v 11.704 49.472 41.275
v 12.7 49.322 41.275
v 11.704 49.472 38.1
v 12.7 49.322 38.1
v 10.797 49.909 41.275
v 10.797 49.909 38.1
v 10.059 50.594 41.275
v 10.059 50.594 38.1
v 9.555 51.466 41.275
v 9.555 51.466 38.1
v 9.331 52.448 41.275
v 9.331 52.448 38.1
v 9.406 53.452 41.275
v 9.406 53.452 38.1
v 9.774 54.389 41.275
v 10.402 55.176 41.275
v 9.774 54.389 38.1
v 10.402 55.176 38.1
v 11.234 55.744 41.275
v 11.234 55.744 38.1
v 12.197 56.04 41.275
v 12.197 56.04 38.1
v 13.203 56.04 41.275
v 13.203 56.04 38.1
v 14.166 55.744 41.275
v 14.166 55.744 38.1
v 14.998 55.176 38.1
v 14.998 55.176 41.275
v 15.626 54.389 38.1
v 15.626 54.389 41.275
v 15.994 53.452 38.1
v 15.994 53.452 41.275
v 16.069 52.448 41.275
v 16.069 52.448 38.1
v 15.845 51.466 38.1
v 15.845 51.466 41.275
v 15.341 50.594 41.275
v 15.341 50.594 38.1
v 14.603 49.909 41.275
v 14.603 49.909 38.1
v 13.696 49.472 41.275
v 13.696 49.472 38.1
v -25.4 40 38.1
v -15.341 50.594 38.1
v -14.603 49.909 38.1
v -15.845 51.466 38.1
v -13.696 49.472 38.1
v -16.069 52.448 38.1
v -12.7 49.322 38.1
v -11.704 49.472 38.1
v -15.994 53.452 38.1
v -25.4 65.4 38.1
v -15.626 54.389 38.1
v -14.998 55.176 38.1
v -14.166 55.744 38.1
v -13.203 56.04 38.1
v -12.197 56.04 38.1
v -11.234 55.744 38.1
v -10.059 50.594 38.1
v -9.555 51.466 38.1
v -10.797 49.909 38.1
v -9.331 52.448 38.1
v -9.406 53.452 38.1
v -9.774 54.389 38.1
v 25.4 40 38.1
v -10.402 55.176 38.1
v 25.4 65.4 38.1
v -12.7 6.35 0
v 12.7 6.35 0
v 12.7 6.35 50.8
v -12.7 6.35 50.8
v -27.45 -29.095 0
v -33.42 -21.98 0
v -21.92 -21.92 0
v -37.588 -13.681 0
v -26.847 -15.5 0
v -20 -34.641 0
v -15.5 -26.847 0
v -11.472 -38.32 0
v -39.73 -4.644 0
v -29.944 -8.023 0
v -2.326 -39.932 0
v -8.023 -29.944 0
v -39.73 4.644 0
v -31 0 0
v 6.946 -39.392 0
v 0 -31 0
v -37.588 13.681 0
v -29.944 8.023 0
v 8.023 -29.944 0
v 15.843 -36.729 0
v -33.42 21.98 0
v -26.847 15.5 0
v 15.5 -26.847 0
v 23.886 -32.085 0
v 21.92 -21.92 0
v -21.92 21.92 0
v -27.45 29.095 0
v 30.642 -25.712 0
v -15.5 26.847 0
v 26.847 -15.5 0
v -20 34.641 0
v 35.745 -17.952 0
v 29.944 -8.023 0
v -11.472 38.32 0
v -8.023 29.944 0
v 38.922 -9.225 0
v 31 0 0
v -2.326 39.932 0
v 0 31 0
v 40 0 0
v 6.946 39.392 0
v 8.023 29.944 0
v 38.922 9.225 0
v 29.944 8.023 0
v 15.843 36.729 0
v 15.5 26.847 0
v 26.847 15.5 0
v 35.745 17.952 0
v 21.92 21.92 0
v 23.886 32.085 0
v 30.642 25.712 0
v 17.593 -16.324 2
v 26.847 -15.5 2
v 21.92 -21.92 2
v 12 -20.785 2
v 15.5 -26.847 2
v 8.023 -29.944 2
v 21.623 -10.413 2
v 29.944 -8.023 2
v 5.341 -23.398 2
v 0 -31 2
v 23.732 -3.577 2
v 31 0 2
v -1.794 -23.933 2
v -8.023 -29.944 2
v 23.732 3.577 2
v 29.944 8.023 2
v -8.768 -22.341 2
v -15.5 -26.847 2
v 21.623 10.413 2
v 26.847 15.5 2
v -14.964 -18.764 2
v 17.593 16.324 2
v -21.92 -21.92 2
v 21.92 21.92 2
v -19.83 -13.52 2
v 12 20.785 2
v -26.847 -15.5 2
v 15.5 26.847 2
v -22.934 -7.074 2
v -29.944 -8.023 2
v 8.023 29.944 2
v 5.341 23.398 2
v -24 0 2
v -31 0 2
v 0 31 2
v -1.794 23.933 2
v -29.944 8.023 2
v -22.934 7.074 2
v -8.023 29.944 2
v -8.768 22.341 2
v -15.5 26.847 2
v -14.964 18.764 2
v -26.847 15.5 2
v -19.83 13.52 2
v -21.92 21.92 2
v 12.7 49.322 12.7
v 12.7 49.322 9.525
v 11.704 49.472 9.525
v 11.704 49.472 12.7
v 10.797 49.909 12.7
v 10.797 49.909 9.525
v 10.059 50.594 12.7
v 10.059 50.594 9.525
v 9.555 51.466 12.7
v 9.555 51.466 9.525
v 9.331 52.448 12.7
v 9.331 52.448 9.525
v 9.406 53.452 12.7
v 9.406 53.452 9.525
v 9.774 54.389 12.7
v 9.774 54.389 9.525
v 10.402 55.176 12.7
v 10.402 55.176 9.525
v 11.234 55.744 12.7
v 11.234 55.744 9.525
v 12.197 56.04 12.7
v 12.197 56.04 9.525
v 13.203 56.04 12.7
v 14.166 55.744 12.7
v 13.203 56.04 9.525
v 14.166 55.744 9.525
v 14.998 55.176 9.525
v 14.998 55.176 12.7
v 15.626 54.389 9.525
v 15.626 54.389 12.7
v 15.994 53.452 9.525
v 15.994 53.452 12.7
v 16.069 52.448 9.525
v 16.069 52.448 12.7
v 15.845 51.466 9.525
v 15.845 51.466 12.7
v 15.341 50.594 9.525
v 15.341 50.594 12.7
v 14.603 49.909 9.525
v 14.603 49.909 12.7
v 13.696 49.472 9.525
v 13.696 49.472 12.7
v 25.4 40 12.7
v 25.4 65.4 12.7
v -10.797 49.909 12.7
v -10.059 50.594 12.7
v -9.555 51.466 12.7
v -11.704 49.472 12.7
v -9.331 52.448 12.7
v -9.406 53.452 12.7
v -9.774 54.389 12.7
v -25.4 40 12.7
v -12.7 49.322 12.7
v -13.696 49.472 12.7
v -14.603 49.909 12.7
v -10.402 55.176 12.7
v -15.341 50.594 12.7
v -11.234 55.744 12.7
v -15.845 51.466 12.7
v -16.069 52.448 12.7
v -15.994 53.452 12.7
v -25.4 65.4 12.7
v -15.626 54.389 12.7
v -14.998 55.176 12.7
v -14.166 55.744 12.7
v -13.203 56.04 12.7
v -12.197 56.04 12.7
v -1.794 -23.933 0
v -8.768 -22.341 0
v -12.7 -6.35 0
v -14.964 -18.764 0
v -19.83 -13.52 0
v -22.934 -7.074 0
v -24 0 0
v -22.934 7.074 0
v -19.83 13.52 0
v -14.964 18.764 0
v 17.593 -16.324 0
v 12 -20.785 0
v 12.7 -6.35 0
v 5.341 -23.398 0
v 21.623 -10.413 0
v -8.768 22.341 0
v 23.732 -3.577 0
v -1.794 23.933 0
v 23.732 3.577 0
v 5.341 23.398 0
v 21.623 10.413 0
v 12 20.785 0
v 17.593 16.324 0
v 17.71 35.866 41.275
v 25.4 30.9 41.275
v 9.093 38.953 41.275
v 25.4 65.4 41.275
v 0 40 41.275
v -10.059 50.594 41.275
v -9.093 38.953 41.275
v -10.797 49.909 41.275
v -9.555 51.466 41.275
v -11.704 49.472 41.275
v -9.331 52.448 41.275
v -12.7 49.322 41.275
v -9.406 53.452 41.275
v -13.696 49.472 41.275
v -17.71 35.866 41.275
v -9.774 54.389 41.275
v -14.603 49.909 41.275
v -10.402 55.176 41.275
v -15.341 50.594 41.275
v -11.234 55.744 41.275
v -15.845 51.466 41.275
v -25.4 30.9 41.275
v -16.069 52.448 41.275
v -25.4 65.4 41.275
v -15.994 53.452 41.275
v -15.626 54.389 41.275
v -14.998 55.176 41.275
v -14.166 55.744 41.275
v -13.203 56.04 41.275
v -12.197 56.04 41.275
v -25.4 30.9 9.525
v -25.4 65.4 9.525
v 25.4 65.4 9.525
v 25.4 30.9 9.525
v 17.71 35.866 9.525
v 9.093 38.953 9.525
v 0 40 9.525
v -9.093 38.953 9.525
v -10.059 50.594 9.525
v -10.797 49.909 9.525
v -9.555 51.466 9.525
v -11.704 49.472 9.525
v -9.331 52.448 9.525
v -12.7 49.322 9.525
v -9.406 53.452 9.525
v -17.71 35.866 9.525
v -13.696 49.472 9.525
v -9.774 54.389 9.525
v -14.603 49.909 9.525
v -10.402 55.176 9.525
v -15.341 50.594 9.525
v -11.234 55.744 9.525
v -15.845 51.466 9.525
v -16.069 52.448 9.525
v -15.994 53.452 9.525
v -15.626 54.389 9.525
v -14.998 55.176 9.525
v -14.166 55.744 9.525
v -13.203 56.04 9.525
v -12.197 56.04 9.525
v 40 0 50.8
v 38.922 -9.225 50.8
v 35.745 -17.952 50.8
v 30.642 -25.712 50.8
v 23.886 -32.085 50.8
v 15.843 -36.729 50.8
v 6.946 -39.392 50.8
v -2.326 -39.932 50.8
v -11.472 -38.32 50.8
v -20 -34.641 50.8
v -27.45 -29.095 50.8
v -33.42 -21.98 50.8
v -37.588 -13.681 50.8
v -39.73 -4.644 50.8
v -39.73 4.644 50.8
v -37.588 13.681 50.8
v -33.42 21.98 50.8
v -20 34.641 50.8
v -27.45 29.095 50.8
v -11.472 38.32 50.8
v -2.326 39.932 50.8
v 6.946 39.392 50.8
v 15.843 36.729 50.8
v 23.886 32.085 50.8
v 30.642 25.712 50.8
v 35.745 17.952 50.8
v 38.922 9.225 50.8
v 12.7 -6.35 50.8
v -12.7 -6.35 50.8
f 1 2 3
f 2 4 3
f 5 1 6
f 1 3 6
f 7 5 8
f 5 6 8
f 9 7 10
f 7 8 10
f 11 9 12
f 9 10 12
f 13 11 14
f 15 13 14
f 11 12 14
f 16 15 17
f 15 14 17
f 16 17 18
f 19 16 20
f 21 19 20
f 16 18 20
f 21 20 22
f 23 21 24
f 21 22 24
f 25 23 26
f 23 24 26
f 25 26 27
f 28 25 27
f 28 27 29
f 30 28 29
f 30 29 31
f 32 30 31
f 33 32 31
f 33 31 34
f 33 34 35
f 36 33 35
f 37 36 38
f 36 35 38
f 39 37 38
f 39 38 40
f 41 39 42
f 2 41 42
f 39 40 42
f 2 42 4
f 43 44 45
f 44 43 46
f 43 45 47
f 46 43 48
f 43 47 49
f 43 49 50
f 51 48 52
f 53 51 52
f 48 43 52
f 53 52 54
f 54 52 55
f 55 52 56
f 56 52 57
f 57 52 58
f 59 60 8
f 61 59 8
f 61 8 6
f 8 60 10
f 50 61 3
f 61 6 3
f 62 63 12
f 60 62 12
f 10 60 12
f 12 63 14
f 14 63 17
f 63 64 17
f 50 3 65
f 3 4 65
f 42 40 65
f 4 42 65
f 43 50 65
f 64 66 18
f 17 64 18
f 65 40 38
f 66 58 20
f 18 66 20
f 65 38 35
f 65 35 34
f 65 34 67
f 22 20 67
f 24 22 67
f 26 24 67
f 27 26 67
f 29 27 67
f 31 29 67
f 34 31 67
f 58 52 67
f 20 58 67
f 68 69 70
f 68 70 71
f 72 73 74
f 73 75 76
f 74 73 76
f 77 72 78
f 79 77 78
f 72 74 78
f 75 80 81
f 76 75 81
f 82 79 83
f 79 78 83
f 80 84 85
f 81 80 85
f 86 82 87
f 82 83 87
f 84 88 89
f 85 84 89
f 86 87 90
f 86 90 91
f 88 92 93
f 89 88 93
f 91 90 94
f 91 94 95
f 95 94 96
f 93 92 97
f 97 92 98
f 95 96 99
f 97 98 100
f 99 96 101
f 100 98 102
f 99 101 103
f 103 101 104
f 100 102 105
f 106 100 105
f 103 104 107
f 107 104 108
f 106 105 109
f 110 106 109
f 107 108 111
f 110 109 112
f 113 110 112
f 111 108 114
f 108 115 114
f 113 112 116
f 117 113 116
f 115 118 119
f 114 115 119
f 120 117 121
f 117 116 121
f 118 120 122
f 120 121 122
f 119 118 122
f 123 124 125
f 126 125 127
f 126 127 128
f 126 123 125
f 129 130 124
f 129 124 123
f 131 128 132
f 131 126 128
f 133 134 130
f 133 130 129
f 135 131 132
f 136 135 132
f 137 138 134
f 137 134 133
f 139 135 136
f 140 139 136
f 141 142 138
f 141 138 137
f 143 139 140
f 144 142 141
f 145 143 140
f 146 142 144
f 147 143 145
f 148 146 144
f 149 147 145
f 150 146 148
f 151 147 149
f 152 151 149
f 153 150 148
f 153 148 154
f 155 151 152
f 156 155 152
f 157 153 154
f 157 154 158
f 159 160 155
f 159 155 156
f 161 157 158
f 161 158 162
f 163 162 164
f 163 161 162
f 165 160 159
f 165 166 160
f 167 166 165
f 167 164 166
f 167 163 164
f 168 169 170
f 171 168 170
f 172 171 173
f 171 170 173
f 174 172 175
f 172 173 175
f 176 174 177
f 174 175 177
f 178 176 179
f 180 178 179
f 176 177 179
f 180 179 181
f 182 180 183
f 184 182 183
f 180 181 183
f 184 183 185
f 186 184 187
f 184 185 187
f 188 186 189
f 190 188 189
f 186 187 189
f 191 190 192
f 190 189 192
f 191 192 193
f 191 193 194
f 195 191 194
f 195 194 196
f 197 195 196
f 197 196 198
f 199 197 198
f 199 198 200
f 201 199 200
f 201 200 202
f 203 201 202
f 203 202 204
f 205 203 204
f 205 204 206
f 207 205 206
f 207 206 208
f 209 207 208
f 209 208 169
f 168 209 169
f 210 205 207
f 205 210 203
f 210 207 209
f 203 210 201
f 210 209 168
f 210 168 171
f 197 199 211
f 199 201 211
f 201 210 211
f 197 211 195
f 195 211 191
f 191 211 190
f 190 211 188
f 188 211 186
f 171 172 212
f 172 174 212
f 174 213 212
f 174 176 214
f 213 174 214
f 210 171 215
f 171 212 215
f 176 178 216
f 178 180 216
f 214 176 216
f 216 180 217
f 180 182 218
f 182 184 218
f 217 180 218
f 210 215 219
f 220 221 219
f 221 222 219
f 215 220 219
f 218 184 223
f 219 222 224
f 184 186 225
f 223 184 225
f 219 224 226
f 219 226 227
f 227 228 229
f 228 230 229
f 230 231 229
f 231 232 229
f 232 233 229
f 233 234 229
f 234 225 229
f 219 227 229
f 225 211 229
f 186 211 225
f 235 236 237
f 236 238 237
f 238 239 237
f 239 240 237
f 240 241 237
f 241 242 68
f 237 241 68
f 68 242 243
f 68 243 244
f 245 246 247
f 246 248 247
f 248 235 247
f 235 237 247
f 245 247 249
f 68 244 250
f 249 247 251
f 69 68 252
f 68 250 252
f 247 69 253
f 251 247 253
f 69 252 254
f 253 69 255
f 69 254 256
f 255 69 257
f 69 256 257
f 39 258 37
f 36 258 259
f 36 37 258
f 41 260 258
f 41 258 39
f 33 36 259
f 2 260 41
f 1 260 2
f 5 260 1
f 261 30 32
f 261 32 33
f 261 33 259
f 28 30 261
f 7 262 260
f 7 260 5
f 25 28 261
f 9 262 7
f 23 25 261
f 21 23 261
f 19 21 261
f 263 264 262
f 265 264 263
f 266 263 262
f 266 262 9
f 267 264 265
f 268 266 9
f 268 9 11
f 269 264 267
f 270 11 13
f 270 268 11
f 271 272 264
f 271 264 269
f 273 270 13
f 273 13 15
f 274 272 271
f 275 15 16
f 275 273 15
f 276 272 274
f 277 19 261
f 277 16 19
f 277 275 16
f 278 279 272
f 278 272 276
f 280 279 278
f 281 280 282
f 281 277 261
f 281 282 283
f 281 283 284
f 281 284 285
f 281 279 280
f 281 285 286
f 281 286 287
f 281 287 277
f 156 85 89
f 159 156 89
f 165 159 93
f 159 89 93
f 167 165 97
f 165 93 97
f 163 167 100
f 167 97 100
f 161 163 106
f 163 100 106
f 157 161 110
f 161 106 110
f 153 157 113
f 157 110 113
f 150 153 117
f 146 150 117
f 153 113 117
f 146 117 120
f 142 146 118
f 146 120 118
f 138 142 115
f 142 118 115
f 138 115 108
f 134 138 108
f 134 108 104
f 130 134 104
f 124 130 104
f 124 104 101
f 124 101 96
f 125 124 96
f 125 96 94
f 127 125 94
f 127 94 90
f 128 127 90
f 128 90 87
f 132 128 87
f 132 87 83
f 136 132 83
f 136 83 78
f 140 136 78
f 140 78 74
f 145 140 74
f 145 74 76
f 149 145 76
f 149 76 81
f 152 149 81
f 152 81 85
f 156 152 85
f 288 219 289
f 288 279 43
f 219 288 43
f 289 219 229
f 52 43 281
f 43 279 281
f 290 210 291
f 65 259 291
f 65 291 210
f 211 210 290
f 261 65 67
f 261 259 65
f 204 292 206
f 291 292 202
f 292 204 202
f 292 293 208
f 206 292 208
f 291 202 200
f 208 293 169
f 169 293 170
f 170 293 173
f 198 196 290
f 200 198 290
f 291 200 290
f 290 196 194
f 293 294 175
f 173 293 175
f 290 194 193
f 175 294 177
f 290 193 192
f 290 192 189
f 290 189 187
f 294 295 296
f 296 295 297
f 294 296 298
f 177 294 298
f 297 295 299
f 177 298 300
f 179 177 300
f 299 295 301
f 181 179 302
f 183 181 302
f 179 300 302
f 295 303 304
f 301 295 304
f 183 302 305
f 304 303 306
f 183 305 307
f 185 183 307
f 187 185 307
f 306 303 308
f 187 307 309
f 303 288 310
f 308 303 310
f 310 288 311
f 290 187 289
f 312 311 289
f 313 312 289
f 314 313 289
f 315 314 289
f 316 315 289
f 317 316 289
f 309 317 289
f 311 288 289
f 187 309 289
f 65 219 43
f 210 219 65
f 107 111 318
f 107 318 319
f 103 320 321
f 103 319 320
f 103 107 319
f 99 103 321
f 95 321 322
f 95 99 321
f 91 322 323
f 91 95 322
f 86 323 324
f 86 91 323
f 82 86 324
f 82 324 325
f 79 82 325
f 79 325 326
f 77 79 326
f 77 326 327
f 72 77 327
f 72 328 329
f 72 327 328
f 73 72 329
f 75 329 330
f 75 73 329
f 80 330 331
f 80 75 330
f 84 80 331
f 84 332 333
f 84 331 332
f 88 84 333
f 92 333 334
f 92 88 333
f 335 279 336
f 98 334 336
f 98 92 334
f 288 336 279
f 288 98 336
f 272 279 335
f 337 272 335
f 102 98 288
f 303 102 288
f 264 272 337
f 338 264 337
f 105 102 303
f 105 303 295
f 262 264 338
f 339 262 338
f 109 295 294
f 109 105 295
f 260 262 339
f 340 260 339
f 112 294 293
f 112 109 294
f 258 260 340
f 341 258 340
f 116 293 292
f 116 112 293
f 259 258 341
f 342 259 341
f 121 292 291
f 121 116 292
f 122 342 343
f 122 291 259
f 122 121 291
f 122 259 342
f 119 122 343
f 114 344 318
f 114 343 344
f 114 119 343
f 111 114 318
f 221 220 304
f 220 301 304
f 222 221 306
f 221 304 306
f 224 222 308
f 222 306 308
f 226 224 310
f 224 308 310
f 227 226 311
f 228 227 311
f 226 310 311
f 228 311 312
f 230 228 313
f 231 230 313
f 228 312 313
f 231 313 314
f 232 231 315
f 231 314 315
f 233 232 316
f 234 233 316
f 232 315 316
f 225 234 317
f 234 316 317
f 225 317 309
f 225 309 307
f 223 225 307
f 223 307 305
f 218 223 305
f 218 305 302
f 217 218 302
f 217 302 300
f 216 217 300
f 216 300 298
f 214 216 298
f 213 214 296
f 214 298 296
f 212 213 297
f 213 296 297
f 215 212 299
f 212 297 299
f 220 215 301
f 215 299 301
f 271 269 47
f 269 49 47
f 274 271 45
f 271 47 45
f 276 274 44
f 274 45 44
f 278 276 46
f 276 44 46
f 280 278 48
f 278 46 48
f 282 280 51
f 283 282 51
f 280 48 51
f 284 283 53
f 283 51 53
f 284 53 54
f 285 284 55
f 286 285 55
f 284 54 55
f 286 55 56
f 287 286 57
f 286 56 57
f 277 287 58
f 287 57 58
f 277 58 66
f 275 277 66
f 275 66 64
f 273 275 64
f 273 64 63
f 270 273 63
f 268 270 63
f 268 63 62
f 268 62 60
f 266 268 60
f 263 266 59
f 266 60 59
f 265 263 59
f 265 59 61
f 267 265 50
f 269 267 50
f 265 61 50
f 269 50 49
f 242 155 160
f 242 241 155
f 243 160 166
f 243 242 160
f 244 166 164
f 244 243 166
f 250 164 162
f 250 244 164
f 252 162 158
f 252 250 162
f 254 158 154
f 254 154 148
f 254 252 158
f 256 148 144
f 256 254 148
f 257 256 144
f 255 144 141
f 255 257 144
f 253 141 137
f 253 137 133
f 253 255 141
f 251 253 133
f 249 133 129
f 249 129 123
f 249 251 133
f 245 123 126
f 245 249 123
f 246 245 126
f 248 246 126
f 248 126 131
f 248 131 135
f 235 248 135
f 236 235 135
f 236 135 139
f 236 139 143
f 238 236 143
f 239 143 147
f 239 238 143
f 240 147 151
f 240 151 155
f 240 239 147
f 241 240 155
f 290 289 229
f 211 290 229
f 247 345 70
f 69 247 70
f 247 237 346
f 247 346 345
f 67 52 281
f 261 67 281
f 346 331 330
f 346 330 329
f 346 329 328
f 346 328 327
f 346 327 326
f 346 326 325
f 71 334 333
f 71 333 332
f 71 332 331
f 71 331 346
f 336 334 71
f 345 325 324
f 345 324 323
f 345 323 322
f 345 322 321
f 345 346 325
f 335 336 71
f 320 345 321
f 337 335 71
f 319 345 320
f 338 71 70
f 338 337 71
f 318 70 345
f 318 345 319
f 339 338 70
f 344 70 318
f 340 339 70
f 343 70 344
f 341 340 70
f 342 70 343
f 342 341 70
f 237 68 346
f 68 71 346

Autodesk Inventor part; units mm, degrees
ref_plane "XZ Plane" through (0, 0, 0) normal (0, 1, 0) x (-1, 0, 0)
ref_plane "XY Plane" through (0, 0, 0) normal (0, 0, 1) x (1, 0, 0)
sketch "Sketch1" plane through (0, 0, 0) normal (0, 0, 1) x (1, 0, 0)
  circle A0 centre (0, 0) radius 40
  dimension "d0" = 80
extrude "Extrusion1" add sketch "Sketch1" along normal blind 50.8
sketch "Sketch2" plane through (0, 0, 0) normal (0, 0, -1) x (-1, 0, 0)
  circle A0 centre (0, 0) radius 31
  circle A1 centre (0, 0) radius 24
  dimension "d3" = 62
  dimension "d4" = 48
extrude "Extrusion2" cut sketch "Sketch2" against normal blind 2
sketch "Sketch3" plane through (0, 0, 0) normal (0, 0, -1) x (-1, 0, 0)
  circle A0 centre (0, 0) radius 3.175
  dimension "d25" = 6.35
extrude "Extrusion3" cut sketch "Sketch3" against normal through all
sketch "Sketch4" plane through (0, 0, 50.8) normal (0, 0, 1) x (1, 0, 0)
  line L0 (-12.7, -6.35) -> (12.7, -6.35)
  line L1 (12.7, -6.35) -> (12.7, 6.35)
  line L2 (12.7, 6.35) -> (-12.7, 6.35)
  line L3 (-12.7, 6.35) -> (-12.7, -6.35)
  line L4 (-12.7, -6.35) -> (12.7, 6.35) construction
  line L5 (12.7, -6.35) -> (-12.7, 6.35) construction
  point P0 (0, 0)
  dimension "d28" = 25.4
  dimension "d29" = 12.7
extrude "Extrusion4" cut sketch "Sketch4" against normal through all
sketch "Sketch6" plane through (0, 0, 0) normal (1, 0, 0) x (0, 1, 0)
  line L0 (40, 0) -> (40, 50.8) construction
  line L1 (40, 25.4) -> (-40, 25.4) construction
  line L2 (-40, 0) -> (-40, 50.8) construction
  line L3 (40, 9.525) -> (65.4, 9.525)
  line L4 (65.4, 9.525) -> (65.4, 25.4)
  line L5 (40, 25.4) -> (27.3, 25.4)
  line L6 (27.3, 9.525) -> (40, 9.525)
  line L7 (27.3, 25.4) -> (27.3, 9.525)
  line L8 (40, 41.275) -> (65.4, 41.275)
  line L9 (65.4, 41.275) -> (65.4, 25.4)
  line L10 (27.3, 41.275) -> (40, 41.275)
  line L11 (27.3, 25.4) -> (27.3, 41.275)
  point P0 (0, 0)
  dimension "d34" = 25.4
  dimension "d35" = 12.7
  dimension "d36" = 15.875
extrude "Extrusion5" add sketch "Sketch6" along normal mid plane 50.8
sketch "Sketch8" plane through (-25.4, 65.4, 41.275) normal (0, 1, 0) x (1, 0, 0)
  line L0 (0, 31.75) -> (50.8, 31.75) projected
  line L1 (0, 3.175) -> (50.8, 3.175)
  line L2 (50.8, 3.175) -> (50.8, 28.575)
  line L3 (50.8, 28.575) -> (0, 28.575)
  line L4 (0, 28.575) -> (0, 3.175)
  line L5 (0, 3.175) -> (50.8, 28.575) construction
  line L6 (50.8, 3.175) -> (0, 28.575) construction
  point P0 (25.4, 41.275)
  point P1 (25.4, 15.875)
  dimension "d43" = 15.875
  dimension "d44" = 25.4
extrude "Extrusion7" cut sketch "Sketch8" against normal blind 25.4
sketch "Sketch9" plane through (0, 0, 41.275) normal (0, 0, 1) x (1, 0, 0)
  line L0 (-25.4, 65.4) -> (25.4, 65.4) projected
  line L1 (0, 86.48) -> (0, -61.08) projected
  point P0 (0, 0)
  point P1 (-12.7, 52.7)
  point P2 (12.7, 52.7)
  dimension "d47" = 12.7
  dimension "d48" = 12.7
  dimension "d49" = 12.7
  dimension "d50" = 12.7
hole "Hole1" at (-12.7, 52.7, 41.275) at (12.7, 52.7, 41.275) direction (0, 0, -1) diameter 6.7564 end through all clearance for "Hex Machine Screw" size "1/4" standard "Ansi Unified Screw Threads"
equation "\"d0\" = mountOuterDiameter"
equation "\"d3\" = ringOuterDiam + ringDiamGap"
equation "\"d4\" = ringInnerDiam - ringDiamGap"
equation "\"ringOuterDiam\" = 60"
equation "\"ringInnerDiam\" = 50"
equation "\"ringThickness\" = 1.5"
equation "\"ringDiamGap\" = 2"
equation "\"mountOuterDiameter\" = 80"
properties part number "MountV05"
